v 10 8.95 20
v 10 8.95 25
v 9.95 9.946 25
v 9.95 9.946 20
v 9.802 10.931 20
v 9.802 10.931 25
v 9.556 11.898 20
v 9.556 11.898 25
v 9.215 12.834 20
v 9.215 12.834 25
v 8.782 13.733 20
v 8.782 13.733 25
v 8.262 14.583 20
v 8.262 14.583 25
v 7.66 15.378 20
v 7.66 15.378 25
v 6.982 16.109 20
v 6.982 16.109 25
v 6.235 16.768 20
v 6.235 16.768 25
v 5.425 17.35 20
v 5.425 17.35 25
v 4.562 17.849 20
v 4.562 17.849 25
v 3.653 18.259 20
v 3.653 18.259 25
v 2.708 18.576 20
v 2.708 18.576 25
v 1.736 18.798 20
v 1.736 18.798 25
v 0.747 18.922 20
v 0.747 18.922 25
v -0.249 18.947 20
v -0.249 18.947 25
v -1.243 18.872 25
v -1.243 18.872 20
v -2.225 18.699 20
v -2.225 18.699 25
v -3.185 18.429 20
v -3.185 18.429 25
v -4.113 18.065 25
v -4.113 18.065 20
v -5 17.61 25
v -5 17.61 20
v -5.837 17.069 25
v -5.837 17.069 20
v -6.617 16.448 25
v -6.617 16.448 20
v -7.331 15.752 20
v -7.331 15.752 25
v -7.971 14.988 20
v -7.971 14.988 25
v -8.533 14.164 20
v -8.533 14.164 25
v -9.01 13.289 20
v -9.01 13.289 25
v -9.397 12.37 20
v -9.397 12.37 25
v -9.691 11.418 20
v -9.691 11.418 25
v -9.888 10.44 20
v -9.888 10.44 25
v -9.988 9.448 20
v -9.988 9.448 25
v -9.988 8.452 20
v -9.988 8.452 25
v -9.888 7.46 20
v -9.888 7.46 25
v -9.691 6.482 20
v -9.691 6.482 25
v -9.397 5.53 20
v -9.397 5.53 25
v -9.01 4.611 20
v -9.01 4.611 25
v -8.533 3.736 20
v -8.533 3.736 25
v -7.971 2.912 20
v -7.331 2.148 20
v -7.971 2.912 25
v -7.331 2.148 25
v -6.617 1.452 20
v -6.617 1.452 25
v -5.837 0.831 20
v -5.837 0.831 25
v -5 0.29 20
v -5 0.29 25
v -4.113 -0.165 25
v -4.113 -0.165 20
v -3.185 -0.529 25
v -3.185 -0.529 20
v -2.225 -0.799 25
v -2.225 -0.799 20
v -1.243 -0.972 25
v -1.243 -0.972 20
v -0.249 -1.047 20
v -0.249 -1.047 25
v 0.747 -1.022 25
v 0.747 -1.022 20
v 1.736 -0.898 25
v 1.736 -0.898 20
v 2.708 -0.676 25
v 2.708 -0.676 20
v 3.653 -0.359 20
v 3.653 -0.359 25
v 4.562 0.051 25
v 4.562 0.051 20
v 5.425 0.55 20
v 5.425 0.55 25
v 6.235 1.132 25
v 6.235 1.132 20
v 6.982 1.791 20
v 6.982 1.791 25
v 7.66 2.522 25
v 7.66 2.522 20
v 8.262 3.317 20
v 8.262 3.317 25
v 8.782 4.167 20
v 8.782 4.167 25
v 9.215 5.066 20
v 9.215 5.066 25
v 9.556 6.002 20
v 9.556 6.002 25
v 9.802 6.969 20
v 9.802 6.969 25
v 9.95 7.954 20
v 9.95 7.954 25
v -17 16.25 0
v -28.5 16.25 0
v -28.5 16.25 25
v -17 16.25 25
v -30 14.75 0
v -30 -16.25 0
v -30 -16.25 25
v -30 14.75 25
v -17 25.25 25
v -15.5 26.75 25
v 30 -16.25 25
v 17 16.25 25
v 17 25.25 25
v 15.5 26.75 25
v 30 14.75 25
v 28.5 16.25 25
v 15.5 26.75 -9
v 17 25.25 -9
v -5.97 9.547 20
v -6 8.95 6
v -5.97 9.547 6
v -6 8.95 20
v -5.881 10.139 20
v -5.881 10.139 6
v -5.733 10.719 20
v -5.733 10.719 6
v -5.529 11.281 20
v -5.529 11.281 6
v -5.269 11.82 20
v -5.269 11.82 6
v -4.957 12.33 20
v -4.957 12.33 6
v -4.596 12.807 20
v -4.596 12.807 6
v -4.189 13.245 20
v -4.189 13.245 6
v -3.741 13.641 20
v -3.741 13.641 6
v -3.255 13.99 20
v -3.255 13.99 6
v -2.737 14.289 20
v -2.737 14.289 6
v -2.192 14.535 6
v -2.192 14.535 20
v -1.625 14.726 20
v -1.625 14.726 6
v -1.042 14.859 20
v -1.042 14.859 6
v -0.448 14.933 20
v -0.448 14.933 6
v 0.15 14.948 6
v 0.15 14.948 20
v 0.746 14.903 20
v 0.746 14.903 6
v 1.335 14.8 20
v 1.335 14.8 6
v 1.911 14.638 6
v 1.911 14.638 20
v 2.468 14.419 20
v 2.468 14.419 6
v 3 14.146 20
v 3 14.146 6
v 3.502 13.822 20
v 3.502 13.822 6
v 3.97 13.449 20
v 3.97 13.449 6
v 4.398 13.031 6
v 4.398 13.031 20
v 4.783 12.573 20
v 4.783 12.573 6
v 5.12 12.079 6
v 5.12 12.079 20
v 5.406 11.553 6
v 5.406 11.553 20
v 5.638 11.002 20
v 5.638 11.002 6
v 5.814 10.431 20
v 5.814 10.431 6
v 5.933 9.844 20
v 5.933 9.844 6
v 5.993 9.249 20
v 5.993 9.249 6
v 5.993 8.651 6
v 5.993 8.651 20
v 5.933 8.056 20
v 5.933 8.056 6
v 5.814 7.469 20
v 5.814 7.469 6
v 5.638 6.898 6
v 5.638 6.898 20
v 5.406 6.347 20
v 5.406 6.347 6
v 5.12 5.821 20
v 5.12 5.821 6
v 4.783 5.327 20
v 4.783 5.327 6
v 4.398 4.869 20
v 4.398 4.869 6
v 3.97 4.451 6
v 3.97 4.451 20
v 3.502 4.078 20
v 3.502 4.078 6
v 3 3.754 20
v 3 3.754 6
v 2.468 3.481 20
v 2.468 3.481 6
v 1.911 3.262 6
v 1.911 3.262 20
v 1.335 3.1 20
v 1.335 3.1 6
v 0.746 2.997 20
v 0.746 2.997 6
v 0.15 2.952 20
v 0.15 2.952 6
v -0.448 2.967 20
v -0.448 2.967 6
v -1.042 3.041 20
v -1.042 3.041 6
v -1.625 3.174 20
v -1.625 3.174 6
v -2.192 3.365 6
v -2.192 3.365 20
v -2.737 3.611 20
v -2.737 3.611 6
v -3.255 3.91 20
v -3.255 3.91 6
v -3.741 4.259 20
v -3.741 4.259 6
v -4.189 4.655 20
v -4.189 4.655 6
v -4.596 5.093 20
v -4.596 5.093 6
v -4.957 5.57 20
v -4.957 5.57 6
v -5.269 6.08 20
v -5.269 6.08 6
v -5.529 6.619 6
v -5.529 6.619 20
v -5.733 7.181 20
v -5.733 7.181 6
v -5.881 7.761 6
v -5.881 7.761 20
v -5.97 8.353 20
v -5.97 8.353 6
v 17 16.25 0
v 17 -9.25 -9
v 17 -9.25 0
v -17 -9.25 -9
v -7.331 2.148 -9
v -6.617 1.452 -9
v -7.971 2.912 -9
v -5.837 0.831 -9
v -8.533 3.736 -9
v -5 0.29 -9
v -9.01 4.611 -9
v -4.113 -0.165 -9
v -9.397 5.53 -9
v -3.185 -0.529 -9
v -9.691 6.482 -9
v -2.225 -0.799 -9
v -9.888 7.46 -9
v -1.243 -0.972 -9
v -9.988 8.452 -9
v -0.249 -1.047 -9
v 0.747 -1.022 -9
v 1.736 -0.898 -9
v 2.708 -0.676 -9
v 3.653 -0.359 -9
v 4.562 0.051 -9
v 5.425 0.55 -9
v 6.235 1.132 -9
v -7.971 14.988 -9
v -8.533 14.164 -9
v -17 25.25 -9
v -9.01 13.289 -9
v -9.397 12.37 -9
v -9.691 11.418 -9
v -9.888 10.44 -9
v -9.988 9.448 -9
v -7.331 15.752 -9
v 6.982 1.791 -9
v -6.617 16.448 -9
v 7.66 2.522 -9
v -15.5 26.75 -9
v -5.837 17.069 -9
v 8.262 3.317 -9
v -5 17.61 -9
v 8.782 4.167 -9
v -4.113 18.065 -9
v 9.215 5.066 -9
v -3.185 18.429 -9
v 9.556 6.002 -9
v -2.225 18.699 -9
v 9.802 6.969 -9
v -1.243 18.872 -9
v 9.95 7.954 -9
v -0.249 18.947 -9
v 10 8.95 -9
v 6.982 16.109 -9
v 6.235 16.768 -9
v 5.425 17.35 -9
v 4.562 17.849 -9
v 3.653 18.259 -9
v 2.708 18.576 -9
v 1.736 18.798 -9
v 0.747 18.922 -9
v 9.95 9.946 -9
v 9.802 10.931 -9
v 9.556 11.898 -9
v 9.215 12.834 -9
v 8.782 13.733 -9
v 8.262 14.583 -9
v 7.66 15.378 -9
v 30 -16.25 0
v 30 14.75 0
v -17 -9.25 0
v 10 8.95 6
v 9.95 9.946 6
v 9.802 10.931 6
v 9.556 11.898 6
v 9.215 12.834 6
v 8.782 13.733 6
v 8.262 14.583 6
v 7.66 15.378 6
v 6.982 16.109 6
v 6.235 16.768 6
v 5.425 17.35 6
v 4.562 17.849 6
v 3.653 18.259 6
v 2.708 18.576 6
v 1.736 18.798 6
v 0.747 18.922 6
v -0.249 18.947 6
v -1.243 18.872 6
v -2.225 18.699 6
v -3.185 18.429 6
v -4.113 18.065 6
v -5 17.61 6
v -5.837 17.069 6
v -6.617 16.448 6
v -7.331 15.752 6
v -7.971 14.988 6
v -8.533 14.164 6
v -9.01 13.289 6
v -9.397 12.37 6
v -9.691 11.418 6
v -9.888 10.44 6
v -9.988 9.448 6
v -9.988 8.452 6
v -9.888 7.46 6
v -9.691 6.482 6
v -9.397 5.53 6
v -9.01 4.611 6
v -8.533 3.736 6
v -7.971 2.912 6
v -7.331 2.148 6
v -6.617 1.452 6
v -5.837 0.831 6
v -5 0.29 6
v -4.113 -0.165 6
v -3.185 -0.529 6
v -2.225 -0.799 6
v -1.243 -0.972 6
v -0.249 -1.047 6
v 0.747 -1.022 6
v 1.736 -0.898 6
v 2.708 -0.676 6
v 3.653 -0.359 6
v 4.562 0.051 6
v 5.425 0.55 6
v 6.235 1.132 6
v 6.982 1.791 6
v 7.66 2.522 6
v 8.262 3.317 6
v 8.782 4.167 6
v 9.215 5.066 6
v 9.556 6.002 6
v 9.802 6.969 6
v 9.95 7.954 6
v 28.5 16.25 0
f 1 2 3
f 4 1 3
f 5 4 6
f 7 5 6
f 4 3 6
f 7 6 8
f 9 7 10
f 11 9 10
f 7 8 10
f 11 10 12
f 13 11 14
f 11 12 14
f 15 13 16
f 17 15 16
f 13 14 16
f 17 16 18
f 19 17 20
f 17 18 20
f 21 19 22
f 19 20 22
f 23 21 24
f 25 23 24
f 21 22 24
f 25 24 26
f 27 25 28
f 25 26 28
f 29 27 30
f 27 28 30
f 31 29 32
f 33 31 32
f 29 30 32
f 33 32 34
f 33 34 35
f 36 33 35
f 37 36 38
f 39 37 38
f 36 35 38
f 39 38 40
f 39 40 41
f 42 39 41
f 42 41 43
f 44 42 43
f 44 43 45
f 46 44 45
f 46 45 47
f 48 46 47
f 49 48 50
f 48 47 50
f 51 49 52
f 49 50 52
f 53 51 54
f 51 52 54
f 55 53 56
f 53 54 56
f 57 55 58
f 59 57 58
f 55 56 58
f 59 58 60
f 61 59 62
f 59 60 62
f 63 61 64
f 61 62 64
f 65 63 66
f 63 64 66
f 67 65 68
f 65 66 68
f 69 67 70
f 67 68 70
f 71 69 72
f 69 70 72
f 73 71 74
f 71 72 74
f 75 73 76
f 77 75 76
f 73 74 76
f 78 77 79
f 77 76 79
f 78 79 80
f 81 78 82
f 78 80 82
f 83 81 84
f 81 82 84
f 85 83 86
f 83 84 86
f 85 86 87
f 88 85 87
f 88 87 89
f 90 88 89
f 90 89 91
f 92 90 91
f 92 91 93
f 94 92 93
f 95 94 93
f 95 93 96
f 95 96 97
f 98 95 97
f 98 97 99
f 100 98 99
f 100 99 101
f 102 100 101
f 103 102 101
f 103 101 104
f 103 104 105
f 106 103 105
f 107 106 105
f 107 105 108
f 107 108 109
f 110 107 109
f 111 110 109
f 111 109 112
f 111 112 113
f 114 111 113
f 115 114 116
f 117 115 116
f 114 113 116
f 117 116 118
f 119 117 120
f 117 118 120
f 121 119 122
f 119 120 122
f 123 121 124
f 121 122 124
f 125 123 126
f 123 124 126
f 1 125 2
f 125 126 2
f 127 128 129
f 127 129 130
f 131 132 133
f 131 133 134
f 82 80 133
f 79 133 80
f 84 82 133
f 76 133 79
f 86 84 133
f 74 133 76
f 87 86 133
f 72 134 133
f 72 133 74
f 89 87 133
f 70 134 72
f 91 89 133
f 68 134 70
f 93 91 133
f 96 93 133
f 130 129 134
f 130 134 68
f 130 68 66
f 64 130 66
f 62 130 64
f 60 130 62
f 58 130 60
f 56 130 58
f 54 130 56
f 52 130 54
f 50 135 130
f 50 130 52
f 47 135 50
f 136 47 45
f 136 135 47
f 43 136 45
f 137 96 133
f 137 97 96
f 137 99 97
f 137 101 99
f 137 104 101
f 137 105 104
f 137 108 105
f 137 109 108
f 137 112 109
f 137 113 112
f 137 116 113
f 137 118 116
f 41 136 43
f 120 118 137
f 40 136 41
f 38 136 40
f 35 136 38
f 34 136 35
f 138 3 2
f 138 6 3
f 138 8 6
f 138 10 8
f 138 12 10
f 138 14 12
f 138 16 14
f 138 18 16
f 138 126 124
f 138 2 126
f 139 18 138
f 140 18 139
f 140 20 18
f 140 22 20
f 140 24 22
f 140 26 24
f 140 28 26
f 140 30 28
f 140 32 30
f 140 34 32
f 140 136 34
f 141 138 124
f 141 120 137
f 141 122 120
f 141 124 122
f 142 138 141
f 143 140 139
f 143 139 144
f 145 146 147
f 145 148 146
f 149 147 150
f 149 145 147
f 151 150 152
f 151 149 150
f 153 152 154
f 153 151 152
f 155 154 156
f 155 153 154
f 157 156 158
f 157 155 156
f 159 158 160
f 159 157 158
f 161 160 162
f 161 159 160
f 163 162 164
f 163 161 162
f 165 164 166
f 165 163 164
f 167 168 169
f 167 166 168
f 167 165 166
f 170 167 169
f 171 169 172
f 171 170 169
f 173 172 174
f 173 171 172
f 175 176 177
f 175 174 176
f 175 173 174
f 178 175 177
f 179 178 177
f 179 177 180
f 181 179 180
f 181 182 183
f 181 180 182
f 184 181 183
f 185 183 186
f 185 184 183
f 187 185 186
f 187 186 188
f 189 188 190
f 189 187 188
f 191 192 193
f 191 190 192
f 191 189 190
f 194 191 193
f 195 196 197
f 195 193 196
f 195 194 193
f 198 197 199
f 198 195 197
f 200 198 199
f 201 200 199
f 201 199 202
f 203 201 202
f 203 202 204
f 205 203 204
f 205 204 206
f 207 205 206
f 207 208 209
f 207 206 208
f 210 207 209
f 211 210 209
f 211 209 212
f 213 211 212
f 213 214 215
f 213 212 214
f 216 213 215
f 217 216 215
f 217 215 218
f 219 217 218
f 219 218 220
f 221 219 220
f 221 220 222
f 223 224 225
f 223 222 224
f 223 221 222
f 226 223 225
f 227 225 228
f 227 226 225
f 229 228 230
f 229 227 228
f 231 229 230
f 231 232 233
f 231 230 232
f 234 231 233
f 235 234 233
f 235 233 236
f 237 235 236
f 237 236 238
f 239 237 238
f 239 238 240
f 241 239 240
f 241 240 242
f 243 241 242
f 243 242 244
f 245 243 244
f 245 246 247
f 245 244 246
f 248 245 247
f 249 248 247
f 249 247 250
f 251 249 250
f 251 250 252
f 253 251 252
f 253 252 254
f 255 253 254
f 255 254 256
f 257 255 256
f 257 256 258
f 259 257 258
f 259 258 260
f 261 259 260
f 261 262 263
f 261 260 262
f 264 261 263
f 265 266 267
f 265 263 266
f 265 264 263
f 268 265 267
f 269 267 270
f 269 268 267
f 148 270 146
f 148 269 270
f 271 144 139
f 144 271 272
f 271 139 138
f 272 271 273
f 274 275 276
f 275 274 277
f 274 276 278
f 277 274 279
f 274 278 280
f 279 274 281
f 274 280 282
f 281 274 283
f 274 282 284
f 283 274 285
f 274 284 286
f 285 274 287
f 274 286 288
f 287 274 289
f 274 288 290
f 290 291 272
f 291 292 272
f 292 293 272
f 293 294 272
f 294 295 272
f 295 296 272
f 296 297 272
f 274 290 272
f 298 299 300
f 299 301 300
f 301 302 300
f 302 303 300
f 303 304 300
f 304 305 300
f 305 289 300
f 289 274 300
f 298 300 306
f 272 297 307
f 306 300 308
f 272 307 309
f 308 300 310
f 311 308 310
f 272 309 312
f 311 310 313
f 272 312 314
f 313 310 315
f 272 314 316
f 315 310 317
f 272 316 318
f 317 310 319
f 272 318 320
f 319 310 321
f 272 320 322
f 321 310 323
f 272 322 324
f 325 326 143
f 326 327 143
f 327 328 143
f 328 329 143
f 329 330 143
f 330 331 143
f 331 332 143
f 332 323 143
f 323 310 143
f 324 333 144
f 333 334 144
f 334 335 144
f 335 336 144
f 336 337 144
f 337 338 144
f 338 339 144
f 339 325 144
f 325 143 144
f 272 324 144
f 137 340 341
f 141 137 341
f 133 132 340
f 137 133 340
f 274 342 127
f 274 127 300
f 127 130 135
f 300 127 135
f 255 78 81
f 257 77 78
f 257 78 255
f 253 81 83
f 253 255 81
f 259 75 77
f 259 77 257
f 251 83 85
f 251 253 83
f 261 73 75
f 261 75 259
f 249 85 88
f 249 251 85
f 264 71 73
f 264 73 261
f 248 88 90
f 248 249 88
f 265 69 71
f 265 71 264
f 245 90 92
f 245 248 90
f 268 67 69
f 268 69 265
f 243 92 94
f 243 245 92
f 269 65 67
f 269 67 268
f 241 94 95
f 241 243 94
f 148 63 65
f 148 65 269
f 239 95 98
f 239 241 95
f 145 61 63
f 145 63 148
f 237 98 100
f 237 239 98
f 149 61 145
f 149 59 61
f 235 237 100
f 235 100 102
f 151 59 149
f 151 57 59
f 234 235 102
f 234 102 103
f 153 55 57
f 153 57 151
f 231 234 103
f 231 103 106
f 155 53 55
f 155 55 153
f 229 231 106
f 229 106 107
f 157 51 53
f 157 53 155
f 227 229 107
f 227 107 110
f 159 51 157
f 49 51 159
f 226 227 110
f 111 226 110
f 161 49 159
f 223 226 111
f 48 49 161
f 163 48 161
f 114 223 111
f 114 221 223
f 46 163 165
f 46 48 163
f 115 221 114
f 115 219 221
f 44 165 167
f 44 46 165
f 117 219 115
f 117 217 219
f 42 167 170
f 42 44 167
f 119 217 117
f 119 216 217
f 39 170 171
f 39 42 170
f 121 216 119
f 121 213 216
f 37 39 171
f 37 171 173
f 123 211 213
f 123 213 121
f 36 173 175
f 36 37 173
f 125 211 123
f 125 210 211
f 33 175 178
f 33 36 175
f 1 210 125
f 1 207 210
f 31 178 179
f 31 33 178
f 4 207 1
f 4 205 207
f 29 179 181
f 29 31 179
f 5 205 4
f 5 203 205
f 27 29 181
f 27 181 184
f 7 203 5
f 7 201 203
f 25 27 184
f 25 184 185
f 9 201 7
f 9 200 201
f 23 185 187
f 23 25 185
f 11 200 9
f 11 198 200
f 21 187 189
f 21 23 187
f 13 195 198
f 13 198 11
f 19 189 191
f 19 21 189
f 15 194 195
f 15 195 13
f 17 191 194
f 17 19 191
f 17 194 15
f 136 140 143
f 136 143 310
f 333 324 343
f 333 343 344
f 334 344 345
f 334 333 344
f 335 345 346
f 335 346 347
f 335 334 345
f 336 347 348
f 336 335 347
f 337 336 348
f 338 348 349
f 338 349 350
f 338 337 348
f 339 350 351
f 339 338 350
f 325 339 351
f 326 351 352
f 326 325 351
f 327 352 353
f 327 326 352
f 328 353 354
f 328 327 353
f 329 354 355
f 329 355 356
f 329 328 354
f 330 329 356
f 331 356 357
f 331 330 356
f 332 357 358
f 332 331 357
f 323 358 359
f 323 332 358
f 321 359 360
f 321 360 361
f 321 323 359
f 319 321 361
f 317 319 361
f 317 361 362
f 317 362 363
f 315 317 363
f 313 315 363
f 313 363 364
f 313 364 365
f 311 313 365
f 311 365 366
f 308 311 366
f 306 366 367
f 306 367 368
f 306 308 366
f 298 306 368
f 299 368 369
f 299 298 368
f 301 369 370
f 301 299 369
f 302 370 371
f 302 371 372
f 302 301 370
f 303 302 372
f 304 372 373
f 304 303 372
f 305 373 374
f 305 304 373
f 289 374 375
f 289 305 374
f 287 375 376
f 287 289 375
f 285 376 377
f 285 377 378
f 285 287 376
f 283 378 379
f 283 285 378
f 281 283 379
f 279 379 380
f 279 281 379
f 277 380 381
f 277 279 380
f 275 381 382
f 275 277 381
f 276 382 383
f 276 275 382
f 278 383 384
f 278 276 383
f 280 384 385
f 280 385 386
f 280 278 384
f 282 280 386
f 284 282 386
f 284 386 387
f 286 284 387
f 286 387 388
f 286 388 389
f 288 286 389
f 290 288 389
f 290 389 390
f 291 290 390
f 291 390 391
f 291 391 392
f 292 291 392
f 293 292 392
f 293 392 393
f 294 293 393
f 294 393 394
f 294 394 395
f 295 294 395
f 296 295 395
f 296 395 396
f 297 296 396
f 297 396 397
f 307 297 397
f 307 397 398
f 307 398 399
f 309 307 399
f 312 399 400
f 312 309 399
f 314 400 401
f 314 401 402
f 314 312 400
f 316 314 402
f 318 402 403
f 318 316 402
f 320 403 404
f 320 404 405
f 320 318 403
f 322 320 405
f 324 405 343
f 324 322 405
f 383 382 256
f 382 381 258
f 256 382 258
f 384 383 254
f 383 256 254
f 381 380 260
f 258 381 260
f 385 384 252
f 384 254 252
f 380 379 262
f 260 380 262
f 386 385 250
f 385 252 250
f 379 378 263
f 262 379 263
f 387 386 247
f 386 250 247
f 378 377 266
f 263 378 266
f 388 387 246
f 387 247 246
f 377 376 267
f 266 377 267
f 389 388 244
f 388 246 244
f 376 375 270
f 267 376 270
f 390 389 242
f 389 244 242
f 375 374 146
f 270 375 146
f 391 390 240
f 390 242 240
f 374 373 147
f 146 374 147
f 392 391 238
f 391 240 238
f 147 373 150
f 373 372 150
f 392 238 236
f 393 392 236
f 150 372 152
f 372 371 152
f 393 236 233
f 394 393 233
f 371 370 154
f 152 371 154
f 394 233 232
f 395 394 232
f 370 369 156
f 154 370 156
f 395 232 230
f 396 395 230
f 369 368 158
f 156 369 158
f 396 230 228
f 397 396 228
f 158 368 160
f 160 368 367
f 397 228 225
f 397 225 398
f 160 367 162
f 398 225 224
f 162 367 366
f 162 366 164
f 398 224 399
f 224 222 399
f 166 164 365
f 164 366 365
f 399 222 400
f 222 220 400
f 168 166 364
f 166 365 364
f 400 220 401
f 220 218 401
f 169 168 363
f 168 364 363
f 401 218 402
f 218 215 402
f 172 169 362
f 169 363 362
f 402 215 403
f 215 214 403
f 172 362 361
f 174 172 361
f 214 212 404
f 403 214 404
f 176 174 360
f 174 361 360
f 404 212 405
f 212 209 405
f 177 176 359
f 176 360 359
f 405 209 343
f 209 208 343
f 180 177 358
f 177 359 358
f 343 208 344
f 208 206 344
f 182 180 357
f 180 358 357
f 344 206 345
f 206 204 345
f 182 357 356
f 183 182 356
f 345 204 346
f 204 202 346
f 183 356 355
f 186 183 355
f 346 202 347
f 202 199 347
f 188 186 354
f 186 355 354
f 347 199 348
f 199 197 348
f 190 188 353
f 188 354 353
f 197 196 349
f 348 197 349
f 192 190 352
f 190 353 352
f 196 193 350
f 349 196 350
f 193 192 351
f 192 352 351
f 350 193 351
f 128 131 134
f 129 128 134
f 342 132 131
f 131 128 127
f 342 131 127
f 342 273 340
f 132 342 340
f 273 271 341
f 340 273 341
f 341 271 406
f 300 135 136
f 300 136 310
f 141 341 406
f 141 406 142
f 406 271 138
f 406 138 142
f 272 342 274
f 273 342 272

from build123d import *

# Parameters (mm, degrees)
CROQUIS1_W              = 60
CROQUIS1_H              = 32.5
SALIENTE_EXTRUIR1_DEPTH = 25
SALIENTE_EXTRUIR2_DEPTH = 34
CROQUIS3_R              = 6
CORTAR_EXTRUIR1_DEPTH   = 35
CHAFL_N1_SIZE           = 1.5
CHAFL_N2_SIZE           = 1.5
CHAFL_N3_SIZE           = 1.5
CROQUIS5_R              = 10
CORTAR_EXTRUIR2_DEPTH   = 15
CROQUIS6_R              = 10
CORTAR_EXTRUIR3_DEPTH   = 5


with BuildPart() as part:
    # Croquis1 → Saliente-Extruir1 (new body)
    with BuildSketch(Plane.XY):
        Rectangle(CROQUIS1_W, CROQUIS1_H)
    extrude(amount=SALIENTE_EXTRUIR1_DEPTH)

    # Croquis2 → Saliente-Extruir2 (add)
    with BuildSketch(Plane(origin=(0, 0, 25), x_dir=(-1, 0, 0), z_dir=(0, 0, -1))):
        Polygon((-17, 16.25), (-17, 26.75), (17, 26.75), (17, 16.25), (17, -9.25), (-17, -9.25), align=None)
    extrude(amount=SALIENTE_EXTRUIR2_DEPTH)

    # Croquis3 → Cortar-Extruir1 (cut, through all)
    with BuildSketch(Plane(origin=(0, 0, 25), x_dir=(-1, 0, 0), z_dir=(0, 0, -1))):
        with Locations((0, 8.95)):
            Circle(CROQUIS3_R)
    extrude(amount=CORTAR_EXTRUIR1_DEPTH, mode=Mode.SUBTRACT)

    # Chaflán1
    chafl_n1_edges = [part.edges().sort_by_distance(p)[0] for p in [
        (17, 26.75, 8),
    ]]
    chamfer(chafl_n1_edges, length=CHAFL_N1_SIZE)

    # Chaflán2
    chafl_n2_edges = [part.edges().sort_by_distance(p)[0] for p in [
        (-17, 26.75, 8),
    ]]
    chamfer(chafl_n2_edges, length=CHAFL_N2_SIZE)

    # Chaflán3
    chafl_n3_edges = [part.edges().sort_by_distance(p)[0] for p in [
        (-30, 16.25, 12.5),
        (30, 16.25, 12.5),
    ]]
    chamfer(chafl_n3_edges, length=CHAFL_N3_SIZE)

    # Croquis5 → Cortar-Extruir2 (cut)
    with BuildSketch(Plane.XY.offset(-9)):
        with Locations((0, 8.95)):
            Circle(CROQUIS5_R)
    extrude(amount=CORTAR_EXTRUIR2_DEPTH, mode=Mode.SUBTRACT)

    # Croquis6 → Cortar-Extruir3 (cut)
    with BuildSketch(Plane.XY.offset(25)):
        with Locations((0, 8.95)):
            Circle(CROQUIS6_R)
    extrude(amount=-CORTAR_EXTRUIR3_DEPTH, mode=Mode.SUBTRACT)


solid = part.part
